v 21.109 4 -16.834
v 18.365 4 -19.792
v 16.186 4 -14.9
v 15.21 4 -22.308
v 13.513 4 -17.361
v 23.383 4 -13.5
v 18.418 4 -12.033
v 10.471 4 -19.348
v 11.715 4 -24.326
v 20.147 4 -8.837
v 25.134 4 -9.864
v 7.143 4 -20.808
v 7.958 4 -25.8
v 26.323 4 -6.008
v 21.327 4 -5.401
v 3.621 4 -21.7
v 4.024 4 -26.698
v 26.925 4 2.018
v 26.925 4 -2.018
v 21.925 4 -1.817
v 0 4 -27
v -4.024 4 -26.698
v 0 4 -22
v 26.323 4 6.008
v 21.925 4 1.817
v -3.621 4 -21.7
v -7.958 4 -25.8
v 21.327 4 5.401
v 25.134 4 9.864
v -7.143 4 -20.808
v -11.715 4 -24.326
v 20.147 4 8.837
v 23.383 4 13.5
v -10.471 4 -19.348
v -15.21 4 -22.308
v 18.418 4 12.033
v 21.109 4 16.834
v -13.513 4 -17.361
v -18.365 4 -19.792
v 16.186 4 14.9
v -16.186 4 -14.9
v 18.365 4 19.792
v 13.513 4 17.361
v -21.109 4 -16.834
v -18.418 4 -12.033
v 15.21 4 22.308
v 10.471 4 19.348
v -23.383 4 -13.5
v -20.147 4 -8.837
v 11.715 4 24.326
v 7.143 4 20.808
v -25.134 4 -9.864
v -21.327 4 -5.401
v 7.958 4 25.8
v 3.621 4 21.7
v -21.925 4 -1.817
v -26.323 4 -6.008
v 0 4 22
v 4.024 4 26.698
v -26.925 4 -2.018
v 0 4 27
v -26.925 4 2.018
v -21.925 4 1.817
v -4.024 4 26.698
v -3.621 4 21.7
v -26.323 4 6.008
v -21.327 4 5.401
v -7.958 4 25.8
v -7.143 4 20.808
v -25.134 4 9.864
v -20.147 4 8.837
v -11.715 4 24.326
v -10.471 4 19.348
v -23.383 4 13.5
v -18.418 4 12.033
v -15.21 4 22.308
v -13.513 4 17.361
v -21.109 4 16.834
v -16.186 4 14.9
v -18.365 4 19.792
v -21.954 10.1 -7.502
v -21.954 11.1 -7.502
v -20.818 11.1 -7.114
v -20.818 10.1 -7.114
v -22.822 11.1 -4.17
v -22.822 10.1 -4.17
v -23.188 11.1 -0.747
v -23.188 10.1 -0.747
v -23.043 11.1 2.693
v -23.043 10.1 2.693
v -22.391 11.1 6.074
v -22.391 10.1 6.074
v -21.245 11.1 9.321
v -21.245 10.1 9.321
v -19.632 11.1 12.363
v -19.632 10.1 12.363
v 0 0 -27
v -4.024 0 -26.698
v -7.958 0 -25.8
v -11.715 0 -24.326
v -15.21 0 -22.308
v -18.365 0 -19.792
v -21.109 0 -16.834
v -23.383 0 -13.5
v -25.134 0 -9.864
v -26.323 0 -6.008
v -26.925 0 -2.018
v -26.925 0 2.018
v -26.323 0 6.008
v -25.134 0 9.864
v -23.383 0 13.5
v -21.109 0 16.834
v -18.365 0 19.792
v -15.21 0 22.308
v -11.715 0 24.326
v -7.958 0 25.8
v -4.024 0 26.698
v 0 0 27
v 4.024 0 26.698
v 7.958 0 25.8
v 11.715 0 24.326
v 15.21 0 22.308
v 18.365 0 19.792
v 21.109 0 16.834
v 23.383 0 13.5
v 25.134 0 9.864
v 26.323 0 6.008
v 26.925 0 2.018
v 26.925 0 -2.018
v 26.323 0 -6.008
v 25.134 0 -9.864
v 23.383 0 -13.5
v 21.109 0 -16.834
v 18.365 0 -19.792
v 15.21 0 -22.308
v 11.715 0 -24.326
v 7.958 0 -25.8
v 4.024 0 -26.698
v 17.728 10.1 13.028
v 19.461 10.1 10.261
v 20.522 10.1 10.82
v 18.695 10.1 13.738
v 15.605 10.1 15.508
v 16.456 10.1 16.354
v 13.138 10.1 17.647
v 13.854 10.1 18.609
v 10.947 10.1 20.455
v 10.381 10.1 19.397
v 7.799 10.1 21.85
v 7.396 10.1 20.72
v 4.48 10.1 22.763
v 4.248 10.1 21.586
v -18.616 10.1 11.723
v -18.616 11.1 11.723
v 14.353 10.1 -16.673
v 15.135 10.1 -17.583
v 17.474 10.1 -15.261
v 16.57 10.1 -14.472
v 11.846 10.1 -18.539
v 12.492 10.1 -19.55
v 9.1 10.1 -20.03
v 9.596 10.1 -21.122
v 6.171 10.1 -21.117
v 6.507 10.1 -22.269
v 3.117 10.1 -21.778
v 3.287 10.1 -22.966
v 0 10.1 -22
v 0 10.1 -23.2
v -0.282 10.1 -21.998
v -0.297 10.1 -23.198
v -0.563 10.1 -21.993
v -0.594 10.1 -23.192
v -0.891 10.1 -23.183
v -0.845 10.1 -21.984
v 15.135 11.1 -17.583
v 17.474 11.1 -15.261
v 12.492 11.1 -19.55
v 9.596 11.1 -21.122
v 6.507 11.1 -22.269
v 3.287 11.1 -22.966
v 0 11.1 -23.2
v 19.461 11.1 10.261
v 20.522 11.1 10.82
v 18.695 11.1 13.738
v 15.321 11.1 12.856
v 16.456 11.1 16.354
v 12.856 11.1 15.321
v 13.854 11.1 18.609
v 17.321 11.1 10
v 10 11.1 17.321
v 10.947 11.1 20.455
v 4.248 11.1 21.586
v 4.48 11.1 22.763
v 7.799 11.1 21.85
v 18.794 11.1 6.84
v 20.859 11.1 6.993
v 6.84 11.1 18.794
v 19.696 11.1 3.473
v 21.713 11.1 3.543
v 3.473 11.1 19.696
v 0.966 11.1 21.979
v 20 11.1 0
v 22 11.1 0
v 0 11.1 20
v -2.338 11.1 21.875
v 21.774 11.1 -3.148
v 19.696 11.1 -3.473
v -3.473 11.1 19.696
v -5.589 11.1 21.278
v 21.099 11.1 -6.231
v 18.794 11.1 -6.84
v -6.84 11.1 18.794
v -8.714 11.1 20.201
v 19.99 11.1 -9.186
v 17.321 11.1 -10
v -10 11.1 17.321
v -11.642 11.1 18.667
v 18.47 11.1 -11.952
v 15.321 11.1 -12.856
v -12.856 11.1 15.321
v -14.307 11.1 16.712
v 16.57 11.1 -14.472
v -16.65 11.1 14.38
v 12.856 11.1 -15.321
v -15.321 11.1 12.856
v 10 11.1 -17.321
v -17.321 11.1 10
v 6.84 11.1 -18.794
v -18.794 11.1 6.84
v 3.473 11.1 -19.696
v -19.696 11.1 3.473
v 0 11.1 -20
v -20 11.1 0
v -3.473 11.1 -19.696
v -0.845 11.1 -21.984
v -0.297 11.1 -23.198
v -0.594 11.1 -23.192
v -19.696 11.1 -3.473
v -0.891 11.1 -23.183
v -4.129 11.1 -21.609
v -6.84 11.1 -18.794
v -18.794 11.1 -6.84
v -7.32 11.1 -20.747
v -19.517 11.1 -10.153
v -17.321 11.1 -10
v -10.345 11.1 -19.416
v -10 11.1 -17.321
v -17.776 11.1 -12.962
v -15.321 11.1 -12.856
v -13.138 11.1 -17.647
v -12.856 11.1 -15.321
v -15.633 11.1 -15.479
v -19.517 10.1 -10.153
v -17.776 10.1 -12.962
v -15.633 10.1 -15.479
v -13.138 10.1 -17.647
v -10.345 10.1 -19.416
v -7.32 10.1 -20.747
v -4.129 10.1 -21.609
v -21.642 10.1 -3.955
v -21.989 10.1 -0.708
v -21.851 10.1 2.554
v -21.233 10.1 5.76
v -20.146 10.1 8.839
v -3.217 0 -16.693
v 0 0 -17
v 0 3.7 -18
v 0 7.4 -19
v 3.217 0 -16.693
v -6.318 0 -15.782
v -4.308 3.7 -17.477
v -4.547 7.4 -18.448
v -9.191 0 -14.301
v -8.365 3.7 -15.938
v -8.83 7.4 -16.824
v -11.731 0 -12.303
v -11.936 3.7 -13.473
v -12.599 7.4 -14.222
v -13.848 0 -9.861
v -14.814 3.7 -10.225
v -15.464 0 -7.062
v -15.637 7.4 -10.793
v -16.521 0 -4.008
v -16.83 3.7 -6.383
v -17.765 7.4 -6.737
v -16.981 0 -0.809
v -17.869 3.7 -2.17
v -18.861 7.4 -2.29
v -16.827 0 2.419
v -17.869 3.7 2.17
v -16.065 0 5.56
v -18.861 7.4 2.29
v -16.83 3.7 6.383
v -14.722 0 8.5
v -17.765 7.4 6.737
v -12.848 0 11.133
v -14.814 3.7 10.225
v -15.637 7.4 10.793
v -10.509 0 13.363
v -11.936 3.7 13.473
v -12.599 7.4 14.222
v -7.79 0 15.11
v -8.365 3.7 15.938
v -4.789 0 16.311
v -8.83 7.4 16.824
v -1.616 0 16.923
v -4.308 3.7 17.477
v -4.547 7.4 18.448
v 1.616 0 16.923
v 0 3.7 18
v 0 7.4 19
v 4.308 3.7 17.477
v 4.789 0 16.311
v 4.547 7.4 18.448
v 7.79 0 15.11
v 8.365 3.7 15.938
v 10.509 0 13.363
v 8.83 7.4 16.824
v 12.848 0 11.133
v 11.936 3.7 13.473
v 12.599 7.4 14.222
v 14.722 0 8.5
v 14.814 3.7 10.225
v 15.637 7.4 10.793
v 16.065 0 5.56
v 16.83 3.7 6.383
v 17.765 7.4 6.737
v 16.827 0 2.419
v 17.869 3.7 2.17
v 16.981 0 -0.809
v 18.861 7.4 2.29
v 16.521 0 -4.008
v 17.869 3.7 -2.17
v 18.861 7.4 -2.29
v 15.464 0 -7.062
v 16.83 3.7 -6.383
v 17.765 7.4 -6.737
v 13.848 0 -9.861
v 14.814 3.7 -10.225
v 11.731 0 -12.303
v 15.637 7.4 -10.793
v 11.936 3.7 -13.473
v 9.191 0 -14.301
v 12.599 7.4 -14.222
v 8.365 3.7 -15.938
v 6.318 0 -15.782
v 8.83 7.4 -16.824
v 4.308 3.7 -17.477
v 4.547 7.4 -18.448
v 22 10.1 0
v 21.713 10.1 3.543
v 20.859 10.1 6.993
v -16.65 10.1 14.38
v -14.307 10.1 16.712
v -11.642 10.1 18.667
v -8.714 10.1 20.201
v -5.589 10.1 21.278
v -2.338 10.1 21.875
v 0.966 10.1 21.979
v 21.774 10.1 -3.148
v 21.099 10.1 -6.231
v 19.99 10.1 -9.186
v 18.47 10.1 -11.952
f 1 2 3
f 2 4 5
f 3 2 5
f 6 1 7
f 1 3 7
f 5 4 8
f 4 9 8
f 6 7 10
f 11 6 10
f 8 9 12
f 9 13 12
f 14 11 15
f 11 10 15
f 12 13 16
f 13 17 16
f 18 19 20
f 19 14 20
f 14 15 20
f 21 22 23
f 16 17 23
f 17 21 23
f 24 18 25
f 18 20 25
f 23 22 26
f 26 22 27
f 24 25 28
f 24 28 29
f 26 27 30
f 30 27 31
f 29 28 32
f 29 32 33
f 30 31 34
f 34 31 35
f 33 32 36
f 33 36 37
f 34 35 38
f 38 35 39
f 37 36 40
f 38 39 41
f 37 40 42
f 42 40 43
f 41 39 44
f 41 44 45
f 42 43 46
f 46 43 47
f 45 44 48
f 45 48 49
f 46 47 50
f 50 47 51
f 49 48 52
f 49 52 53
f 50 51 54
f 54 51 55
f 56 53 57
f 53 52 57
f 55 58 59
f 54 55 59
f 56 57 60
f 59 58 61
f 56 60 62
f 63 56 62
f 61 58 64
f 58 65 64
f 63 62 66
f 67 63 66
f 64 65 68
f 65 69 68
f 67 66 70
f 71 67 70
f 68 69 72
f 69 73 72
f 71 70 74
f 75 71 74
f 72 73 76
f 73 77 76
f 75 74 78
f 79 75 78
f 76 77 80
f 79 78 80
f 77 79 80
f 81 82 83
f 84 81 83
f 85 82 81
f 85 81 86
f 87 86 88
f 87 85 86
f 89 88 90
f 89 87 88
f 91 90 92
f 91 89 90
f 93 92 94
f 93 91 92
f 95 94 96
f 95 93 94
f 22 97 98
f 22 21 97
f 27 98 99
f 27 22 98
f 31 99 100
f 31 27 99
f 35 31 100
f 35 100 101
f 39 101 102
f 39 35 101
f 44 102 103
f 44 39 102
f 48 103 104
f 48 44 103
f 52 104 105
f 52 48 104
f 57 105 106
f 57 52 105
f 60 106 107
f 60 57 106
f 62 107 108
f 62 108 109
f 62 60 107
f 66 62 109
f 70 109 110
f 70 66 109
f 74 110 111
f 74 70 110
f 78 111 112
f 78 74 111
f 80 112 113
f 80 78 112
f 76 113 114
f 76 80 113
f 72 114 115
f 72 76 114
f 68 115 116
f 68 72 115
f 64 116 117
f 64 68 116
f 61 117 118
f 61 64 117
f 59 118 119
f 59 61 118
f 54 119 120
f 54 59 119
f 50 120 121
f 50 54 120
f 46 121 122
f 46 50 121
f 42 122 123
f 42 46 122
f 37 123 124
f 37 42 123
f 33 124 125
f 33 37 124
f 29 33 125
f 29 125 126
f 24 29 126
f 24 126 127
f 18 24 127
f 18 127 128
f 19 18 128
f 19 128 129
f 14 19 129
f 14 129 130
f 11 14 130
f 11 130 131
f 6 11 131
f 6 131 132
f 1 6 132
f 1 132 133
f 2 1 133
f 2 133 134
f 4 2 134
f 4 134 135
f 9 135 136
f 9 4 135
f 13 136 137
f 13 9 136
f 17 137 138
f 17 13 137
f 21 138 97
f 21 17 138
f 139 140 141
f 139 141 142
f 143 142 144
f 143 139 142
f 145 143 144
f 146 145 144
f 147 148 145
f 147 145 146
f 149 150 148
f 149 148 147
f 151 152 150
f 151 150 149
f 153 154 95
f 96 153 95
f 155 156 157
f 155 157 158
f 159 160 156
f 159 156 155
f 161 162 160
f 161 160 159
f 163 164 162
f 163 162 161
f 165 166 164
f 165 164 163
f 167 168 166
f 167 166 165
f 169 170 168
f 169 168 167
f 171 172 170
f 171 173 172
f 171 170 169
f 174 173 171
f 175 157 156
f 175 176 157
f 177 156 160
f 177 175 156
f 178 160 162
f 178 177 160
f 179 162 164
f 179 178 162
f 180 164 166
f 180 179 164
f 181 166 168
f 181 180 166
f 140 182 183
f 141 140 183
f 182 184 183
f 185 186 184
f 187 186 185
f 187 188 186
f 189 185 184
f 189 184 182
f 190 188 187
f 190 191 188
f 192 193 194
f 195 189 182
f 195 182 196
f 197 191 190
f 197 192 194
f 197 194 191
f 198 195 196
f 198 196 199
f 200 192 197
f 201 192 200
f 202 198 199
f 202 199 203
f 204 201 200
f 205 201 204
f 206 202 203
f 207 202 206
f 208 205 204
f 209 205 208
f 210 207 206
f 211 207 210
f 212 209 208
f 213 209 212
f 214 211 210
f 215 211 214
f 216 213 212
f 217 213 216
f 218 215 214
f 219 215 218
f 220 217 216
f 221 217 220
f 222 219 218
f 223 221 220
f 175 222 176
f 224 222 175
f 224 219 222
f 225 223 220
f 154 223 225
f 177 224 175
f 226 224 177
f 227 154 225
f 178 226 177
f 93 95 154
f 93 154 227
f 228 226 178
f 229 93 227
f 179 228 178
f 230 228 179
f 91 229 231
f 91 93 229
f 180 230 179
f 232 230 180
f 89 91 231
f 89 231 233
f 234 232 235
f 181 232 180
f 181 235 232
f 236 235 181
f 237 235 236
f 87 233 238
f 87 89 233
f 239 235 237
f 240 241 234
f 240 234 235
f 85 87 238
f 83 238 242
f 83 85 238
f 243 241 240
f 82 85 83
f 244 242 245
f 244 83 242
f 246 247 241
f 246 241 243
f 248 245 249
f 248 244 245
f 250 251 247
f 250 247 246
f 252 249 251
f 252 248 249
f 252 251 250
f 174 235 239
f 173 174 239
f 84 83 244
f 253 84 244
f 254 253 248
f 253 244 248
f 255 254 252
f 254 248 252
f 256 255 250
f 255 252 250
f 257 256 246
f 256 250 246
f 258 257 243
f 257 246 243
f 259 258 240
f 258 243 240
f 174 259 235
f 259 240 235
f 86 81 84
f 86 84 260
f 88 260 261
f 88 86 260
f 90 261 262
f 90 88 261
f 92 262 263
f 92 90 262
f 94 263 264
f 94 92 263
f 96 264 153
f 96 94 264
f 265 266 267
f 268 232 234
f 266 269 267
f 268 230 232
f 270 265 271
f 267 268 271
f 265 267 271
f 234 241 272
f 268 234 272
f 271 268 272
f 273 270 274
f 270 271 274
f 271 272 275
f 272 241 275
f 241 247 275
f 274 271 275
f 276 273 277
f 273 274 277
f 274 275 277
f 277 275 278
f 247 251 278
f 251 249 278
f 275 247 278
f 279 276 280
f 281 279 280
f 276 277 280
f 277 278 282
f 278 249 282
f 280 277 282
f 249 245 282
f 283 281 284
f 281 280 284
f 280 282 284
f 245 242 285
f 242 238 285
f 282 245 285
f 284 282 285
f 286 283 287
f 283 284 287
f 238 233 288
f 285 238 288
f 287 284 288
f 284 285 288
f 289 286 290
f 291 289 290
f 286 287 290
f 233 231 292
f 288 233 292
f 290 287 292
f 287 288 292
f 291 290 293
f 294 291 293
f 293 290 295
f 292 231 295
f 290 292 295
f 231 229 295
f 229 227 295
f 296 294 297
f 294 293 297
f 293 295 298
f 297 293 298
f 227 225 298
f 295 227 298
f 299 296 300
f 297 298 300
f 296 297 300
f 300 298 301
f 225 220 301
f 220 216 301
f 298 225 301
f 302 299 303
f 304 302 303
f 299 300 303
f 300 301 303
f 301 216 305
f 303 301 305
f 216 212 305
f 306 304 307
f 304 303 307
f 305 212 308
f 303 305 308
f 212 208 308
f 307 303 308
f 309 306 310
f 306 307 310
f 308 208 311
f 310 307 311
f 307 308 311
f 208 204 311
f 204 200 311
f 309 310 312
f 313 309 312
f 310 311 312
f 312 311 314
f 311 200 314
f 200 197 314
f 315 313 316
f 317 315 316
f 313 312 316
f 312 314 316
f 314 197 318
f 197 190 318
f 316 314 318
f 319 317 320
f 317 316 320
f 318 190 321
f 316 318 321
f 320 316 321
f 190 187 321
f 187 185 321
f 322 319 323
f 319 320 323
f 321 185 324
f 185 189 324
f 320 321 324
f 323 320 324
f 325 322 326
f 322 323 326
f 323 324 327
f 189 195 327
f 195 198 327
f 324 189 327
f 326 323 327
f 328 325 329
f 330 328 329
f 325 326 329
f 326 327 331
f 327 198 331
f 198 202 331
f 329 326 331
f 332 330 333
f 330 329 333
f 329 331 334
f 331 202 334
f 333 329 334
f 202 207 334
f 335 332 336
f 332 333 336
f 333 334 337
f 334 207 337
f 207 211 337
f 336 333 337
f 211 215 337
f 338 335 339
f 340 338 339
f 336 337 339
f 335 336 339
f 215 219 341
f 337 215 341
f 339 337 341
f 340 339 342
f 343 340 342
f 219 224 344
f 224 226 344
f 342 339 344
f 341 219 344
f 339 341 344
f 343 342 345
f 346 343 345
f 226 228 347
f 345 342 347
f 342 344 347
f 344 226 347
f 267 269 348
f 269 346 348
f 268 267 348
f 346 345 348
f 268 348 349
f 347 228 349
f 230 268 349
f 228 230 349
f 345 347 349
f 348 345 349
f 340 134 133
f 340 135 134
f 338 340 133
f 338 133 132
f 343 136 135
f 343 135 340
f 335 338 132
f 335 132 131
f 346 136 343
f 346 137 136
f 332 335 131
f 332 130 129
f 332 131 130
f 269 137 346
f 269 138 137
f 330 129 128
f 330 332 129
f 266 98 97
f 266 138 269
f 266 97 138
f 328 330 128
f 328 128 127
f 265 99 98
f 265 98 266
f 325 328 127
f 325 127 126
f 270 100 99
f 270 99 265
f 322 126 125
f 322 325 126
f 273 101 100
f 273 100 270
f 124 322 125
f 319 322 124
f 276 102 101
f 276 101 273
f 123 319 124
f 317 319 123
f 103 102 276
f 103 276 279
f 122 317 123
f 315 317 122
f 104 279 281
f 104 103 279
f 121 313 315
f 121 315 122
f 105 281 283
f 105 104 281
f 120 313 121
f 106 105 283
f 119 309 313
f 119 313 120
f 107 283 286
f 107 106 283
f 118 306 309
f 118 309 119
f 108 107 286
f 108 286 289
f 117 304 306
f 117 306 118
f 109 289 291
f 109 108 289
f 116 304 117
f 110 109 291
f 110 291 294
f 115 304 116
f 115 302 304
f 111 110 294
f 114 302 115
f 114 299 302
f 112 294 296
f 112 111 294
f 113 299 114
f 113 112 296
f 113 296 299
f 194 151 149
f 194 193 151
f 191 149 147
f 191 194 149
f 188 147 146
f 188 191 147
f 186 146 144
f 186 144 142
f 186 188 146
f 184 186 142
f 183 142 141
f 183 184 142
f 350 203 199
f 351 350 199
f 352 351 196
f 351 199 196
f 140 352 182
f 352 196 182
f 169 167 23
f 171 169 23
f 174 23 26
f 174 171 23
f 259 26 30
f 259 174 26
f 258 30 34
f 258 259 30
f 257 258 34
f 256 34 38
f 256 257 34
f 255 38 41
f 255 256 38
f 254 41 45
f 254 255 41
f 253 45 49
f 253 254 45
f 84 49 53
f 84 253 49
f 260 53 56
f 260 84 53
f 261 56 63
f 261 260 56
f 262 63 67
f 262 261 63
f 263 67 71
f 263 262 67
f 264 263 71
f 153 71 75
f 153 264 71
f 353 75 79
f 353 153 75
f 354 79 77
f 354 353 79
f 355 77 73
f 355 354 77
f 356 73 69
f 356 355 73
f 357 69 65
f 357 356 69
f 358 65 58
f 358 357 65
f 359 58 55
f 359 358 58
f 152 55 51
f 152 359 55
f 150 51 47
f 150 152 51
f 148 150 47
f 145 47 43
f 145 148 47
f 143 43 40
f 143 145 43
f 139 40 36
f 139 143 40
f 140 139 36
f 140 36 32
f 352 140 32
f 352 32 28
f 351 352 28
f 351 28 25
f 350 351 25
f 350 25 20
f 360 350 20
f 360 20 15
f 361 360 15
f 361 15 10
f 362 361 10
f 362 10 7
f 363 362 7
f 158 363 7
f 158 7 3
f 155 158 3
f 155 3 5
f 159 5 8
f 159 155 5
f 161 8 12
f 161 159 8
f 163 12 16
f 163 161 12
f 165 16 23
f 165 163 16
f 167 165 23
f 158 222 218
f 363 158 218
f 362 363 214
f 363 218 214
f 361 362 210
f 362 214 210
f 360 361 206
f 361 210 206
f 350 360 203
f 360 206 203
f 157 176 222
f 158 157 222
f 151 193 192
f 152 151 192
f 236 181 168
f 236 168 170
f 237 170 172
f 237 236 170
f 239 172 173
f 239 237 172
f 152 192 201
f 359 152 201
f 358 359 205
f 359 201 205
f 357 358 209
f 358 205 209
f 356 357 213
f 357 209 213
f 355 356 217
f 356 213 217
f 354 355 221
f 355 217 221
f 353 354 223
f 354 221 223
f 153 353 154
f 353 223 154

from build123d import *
from build123d.topology import SkipClean

# Parameters (mm, degrees)
SKETCH1_W          = 2
SKETCH1_H          = 11.1
SKETCH1_W_2        = 5
SKETCH1_H_2        = 4
SKETCH1_W_3        = 1.2
SKETCH1_H_3        = 1
CUT_EXTRUDE1_DEPTH = 1


with BuildPart() as part:
    # Sketch1 → Revolve1 (revolve)
    with BuildSketch(Plane.XY, mode=Mode.PRIVATE) as revolve1_sk:
        with Locations((21, 5.55)):
            Rectangle(SKETCH1_W, SKETCH1_H)
        with Locations((24.5, 2)):
            Rectangle(SKETCH1_W_2, SKETCH1_H_2)
        with Locations((22.6, 10.6)):
            Rectangle(SKETCH1_W_3, SKETCH1_H_3)
        Polygon((17, 0), (20, 11.1), (20, 0), align=None)
    revolve(revolve1_sk.sketch.rotate(Axis((0, 0, 0), (0, 1, 0)), 90), axis=Axis((0, 0, 0), (0, 1, 0)))  # turned: the seam where the file's is

    # Sketch3 → Cut-Extrude1 (cut)
    with SkipClean():  # keep this step's faces unmerged: merging them makes the solid invalid here
        with BuildSketch(Plane(origin=(0, 11.1, 0), x_dir=(1, 0, 0), z_dir=(0, 1, 0))):
            with BuildLine():
                ThreePointArc((23.2, 0), (21.721311586, 8.150130242), (17.473739399, 15.261337799))
                Line((17.473739399, 15.261337799), (16.569925293, 14.471958257))
                ThreePointArc((16.569925293, 14.471958257), (20.59779547, 7.728571782), (22, 0))
                ThreePointArc((22, 0), (21.355762595, -5.285016934), (19.460781455, -10.260506087))
                Line((19.460781455, -10.260506087), (20.522278625, -10.820170056))
                ThreePointArc((20.522278625, -10.820170056), (22.520622373, -5.573290585), (23.2, 0))
            make_face()
            with BuildLine():
                Line((-18.616249655, -11.723278074), (-19.631681454, -12.362729605))
                ThreePointArc((-19.631681454, -12.362729605), (-9.18901176, -21.302630421), (4.47983653, -22.763371118))
                Line((4.47983653, -22.763371118), (4.248120847, -21.585955371))
                ThreePointArc((4.248120847, -21.585955371), (-8.713718048, -20.200770227), (-18.616249655, -11.723278074))
            make_face()
            with BuildLine():
                Line((-0.8445318, 21.983784161), (-0.890597171, 23.182899661))
                ThreePointArc((-0.890597171, 23.182899661), (-13.854113232, 18.609232831), (-21.953575929, 7.50203332))
                Line((-21.953575929, 7.50203332), (-20.81804614, 7.113997113))
                ThreePointArc((-20.81804614, 7.113997113), (-13.137521169, 17.646686305), (-0.8445318, 21.983784161))
            make_face()
        extrude(amount=-CUT_EXTRUDE1_DEPTH, mode=Mode.SUBTRACT)


solid = part.part
